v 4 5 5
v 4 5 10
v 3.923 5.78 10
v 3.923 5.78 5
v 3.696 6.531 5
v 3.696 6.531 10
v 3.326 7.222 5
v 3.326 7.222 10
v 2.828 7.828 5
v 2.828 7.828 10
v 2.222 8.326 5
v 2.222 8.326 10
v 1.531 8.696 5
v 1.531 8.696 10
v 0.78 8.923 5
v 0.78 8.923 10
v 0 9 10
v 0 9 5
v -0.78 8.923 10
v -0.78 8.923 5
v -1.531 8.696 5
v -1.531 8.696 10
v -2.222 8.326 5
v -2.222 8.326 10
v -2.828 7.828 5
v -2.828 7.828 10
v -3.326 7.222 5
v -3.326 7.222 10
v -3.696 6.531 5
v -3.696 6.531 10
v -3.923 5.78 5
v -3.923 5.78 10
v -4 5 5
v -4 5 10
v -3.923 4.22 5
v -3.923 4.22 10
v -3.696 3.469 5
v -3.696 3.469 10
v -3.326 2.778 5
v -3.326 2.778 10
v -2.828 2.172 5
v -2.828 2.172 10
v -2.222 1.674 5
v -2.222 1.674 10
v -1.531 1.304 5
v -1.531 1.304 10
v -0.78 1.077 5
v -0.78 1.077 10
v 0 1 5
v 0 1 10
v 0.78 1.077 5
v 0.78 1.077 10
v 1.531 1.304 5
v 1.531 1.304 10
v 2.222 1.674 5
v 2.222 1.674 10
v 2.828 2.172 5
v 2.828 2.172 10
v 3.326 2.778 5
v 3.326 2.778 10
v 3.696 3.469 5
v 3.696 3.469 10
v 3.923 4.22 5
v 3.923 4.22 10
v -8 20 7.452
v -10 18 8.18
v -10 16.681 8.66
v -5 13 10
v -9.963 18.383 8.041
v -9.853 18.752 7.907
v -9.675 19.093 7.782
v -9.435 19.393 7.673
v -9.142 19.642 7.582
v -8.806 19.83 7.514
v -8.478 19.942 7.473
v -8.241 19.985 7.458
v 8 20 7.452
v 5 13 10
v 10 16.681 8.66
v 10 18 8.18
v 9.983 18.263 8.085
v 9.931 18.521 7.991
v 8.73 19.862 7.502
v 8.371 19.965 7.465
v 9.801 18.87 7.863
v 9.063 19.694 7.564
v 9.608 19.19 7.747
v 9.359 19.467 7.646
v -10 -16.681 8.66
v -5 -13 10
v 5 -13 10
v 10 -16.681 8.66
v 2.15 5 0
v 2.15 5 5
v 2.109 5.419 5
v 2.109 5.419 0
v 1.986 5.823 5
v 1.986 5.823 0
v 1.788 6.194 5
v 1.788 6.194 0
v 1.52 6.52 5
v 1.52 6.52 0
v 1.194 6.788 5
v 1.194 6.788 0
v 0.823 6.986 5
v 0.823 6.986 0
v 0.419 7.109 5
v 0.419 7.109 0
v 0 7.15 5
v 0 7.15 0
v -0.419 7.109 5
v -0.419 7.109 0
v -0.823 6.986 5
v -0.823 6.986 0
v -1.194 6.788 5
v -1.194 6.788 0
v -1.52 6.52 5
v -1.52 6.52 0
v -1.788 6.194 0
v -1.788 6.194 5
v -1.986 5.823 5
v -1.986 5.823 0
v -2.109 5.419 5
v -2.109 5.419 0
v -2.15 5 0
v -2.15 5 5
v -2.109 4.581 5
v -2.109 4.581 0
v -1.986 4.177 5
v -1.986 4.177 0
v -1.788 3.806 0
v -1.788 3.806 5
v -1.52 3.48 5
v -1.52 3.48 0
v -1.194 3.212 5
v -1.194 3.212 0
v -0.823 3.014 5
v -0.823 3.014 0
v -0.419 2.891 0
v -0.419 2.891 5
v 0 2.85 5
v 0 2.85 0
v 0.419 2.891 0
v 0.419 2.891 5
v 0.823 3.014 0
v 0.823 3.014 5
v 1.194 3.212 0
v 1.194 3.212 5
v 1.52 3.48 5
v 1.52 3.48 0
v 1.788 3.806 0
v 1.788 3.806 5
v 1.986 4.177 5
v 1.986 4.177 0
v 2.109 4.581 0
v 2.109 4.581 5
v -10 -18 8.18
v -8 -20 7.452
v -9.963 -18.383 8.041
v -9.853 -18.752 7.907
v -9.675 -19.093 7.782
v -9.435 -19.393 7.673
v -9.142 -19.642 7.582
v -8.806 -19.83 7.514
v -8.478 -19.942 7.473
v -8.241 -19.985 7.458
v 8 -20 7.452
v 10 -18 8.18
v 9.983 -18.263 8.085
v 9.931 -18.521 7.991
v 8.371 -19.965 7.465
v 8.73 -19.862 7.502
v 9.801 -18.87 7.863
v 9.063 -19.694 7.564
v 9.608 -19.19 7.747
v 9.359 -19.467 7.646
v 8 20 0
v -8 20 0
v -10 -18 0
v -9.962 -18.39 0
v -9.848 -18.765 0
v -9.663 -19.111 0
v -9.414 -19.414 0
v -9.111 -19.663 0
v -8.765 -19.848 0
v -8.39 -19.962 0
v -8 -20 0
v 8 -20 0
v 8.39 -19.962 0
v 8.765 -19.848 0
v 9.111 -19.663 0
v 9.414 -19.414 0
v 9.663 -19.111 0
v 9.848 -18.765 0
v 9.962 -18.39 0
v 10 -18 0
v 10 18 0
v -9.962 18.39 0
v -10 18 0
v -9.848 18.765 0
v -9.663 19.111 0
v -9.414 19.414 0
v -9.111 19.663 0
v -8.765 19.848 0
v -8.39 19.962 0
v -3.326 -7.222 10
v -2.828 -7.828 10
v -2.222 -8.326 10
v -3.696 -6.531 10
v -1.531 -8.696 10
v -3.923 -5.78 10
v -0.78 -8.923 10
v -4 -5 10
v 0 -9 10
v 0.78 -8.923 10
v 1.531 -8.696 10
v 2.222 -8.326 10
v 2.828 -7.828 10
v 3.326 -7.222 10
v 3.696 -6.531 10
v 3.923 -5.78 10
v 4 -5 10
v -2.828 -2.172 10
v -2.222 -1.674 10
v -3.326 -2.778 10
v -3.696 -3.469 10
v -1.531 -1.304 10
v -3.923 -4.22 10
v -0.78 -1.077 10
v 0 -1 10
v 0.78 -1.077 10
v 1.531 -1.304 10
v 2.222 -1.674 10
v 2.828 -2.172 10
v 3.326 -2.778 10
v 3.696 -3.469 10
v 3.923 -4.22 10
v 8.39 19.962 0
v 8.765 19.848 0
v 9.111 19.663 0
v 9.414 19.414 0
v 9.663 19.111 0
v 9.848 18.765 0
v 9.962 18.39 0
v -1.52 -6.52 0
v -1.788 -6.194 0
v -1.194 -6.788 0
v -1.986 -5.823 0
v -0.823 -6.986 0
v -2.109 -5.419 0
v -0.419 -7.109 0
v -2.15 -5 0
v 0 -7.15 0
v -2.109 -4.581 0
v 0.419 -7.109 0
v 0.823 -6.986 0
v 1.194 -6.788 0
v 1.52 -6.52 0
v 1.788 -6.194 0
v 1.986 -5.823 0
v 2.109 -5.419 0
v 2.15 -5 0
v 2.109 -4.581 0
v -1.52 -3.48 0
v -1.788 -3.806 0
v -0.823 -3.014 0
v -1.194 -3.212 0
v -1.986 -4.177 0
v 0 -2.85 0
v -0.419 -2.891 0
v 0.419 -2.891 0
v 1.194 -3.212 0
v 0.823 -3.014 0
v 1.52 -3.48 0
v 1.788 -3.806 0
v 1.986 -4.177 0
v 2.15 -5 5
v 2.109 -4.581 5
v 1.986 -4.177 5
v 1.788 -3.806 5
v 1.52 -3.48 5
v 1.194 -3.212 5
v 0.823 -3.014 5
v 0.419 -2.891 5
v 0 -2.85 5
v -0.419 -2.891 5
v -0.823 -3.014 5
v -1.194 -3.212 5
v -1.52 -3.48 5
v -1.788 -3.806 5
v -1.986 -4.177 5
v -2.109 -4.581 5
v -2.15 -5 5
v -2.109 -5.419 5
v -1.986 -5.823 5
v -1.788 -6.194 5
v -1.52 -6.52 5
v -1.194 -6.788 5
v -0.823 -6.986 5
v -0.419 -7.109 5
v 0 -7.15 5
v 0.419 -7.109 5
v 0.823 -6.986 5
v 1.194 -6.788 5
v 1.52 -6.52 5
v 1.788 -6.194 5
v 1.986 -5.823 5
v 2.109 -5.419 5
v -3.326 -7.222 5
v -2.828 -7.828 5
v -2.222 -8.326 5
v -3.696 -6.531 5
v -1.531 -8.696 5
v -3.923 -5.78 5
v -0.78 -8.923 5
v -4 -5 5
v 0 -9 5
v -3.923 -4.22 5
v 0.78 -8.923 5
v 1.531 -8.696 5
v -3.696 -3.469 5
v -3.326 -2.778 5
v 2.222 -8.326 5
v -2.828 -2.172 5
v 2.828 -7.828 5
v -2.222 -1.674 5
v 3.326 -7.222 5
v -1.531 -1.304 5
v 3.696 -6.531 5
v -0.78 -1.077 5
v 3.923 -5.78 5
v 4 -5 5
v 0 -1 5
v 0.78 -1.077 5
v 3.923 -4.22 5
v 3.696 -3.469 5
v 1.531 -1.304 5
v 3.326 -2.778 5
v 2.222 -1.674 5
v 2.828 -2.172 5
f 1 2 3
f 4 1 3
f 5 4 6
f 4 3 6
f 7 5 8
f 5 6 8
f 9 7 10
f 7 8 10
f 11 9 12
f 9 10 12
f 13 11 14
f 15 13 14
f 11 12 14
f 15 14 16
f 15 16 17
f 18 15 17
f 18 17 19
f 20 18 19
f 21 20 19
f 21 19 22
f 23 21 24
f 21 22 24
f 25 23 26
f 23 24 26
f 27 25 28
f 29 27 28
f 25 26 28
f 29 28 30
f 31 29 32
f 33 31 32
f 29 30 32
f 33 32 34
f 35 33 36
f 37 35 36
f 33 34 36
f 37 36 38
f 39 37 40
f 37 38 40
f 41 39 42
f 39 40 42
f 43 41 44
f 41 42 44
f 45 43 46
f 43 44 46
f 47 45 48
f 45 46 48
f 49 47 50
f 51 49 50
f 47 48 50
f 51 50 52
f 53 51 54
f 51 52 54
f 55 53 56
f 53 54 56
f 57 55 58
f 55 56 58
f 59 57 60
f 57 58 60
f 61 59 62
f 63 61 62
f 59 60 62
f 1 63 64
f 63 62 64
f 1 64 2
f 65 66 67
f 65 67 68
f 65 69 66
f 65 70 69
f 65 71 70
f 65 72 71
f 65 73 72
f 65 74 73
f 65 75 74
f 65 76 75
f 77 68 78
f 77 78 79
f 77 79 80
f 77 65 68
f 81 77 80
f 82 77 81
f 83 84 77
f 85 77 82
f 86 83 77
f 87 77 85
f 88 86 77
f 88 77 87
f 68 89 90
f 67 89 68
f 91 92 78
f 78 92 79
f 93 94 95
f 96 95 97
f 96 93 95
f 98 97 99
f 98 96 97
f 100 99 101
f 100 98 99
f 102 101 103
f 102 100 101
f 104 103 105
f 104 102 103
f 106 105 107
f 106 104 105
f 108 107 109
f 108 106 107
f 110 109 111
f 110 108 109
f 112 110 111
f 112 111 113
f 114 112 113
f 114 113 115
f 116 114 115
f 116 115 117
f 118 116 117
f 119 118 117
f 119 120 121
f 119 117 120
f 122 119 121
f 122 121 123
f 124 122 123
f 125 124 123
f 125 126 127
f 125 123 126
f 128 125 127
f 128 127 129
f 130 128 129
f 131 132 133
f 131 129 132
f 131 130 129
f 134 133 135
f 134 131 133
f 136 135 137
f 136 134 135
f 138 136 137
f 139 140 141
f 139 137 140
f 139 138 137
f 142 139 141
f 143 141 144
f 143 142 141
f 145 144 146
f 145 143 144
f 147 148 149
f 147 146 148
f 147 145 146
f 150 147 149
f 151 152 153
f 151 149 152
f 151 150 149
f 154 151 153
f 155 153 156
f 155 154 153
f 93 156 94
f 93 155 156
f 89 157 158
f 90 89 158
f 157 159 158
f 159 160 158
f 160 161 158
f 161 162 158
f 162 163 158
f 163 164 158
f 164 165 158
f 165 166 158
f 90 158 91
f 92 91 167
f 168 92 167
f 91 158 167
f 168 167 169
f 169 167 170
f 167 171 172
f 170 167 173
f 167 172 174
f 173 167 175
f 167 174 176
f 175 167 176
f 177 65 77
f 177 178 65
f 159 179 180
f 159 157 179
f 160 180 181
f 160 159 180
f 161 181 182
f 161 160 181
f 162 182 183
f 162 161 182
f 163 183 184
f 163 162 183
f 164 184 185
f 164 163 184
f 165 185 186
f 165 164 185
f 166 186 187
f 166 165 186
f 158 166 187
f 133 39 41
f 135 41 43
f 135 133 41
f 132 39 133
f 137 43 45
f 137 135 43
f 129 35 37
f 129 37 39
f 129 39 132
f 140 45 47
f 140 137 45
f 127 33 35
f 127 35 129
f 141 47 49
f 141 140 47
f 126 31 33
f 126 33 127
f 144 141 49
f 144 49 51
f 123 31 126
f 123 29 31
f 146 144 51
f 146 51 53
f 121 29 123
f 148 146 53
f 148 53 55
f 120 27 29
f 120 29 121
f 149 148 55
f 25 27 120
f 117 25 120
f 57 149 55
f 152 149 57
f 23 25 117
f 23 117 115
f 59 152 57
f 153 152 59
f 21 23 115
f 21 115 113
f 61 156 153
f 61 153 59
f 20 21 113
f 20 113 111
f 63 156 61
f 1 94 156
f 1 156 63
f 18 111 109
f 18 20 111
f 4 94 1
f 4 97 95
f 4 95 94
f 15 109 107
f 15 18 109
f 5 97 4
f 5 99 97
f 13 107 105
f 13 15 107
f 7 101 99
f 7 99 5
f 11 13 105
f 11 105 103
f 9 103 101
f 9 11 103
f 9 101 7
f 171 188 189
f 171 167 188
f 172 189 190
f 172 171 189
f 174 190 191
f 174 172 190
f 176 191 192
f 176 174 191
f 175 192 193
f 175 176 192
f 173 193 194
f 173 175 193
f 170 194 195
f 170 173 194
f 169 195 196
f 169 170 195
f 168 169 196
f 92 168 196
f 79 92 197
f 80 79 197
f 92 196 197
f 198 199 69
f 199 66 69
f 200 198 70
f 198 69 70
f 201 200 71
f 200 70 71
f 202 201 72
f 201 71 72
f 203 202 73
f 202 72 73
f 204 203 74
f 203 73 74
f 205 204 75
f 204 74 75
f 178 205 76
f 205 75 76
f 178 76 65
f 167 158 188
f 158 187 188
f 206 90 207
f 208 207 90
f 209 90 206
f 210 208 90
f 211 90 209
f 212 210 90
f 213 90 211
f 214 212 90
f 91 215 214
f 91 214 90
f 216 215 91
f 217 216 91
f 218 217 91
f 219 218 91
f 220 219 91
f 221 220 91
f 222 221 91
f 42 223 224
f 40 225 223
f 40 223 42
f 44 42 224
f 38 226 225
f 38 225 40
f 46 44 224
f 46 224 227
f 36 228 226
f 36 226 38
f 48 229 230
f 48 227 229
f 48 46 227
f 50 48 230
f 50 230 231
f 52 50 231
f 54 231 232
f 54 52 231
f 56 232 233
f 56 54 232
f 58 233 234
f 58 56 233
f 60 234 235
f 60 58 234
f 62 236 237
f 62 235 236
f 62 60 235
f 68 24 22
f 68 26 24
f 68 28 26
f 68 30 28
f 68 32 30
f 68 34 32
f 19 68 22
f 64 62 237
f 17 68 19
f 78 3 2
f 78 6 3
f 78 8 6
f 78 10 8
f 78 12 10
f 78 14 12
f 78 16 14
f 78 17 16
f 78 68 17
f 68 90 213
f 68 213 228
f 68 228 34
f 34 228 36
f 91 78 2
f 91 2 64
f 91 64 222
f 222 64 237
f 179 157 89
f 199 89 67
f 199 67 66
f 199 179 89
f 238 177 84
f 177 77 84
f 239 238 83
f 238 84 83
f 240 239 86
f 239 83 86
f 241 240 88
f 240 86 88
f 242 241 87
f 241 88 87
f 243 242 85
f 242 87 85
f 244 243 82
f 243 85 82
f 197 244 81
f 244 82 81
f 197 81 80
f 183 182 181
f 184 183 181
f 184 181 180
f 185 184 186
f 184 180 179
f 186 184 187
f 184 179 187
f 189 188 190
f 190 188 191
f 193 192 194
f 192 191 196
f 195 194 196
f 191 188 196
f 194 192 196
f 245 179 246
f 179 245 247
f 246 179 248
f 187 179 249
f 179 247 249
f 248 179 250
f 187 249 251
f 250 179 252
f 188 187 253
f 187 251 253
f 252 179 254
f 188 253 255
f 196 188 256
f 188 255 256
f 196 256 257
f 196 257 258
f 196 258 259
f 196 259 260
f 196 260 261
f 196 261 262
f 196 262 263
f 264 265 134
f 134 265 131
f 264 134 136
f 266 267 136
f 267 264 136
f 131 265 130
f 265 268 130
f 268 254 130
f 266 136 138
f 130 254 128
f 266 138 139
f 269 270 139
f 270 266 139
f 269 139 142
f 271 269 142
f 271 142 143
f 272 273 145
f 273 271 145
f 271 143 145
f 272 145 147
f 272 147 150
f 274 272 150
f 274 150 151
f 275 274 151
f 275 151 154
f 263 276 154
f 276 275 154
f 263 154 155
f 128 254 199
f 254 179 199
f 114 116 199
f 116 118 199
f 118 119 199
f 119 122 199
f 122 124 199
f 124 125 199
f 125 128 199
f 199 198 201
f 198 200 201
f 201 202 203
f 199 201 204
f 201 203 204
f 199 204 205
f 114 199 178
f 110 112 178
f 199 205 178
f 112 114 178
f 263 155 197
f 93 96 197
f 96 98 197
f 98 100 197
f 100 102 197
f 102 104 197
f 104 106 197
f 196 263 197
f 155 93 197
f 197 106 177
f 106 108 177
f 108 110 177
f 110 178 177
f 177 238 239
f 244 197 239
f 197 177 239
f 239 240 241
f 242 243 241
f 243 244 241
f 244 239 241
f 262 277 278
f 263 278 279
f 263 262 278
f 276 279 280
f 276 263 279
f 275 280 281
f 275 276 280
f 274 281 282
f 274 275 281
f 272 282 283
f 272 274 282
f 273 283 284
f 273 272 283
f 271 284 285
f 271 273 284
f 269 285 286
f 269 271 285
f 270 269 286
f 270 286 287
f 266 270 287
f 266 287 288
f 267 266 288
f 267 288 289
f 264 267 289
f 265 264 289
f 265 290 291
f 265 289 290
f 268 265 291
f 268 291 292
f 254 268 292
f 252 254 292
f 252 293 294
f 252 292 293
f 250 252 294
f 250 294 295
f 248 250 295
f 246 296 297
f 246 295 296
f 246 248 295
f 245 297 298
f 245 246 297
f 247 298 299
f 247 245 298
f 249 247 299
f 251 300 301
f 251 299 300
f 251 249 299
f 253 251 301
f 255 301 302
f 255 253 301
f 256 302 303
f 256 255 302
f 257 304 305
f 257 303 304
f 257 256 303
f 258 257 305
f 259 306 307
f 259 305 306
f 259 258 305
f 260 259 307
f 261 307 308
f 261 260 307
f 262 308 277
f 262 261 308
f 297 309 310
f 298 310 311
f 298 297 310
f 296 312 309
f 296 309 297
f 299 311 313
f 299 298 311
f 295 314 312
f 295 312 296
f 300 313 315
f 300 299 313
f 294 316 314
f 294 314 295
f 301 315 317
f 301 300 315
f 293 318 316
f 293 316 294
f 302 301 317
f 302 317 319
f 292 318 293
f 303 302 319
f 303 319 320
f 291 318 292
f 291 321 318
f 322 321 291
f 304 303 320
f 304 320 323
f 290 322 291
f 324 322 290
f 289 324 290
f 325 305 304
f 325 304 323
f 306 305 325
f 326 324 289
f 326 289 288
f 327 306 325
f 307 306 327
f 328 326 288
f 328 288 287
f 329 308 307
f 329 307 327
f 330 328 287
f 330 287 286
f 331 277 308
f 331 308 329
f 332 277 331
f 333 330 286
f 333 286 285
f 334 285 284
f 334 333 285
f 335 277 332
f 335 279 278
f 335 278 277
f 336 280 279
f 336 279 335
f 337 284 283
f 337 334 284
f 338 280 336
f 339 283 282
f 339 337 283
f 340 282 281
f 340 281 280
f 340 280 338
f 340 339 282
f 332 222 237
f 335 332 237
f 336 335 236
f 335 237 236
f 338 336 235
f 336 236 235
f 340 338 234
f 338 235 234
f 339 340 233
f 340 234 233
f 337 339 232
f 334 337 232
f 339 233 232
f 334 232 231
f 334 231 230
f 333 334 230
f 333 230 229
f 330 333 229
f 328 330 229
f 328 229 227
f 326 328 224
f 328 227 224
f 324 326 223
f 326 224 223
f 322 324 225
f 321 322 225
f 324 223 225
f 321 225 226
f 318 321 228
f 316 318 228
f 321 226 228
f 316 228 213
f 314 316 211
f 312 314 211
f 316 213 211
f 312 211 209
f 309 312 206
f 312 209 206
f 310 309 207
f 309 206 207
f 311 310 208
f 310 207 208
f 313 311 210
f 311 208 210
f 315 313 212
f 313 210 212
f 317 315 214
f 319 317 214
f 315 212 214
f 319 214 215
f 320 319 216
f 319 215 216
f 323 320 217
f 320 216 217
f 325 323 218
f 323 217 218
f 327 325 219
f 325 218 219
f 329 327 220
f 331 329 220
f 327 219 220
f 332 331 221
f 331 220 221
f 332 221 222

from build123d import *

# Parameters (mm, degrees)
SKETCH1_W           = 20
SKETCH1_H           = 40
SKETCH1_R           = 2.15
BOSS_EXTRUDE1_DEPTH = 10
CHAMFER1_SIZE       = 5
CHAMFER1_SIZE2      = 1.339745962
CHAMFER2_SIZE       = 7
CHAMFER2_SIZE2      = 2.54779164
SKETCH2_R           = 4
CUT_EXTRUDE1_DEPTH  = 5
FILLET1_R           = 2


with BuildPart() as part:
    # Sketch1 → Boss-Extrude1 (new body)
    with BuildSketch(Plane.XY):
        Rectangle(SKETCH1_W, SKETCH1_H)
        with Locations((0, -5)):
            Circle(SKETCH1_R, mode=Mode.SUBTRACT)
        with Locations((0, 5)):
            Circle(SKETCH1_R, mode=Mode.SUBTRACT)
    extrude(amount=BOSS_EXTRUDE1_DEPTH)

    # Chamfer1
    chamfer1_edges = [part.edges().sort_by_distance(p)[0] for p in [
        (-10, 0, 10),
        (10, 0, 10),
    ]]
    chamfer1_side = [part.faces().sort_by_distance(p)[0] for p in [
        (0, 0, 10),
    ]]
    chamfer(chamfer1_edges, length=CHAMFER1_SIZE, length2=CHAMFER1_SIZE2, reference=chamfer1_side[0])

    # Chamfer2
    chamfer2_edges = [part.edges().sort_by_distance(p)[0] for p in [
        (0, -20, 10),
        (0, 20, 10),
    ]]
    chamfer2_side = [part.faces().sort_by_distance(p)[0] for p in [
        (0, 0, 10),
    ]]
    chamfer(chamfer2_edges, length=CHAMFER2_SIZE, length2=CHAMFER2_SIZE2, reference=chamfer2_side[0])

    # Sketch2 → Cut-Extrude1 (cut)
    with BuildSketch(Plane.XY.offset(10)):
        with Locations((0, 5)):
            Circle(SKETCH2_R)
        with Locations((0, -5)):
            Circle(SKETCH2_R)
    extrude(amount=-CUT_EXTRUDE1_DEPTH, mode=Mode.SUBTRACT)

    # Fillet1
    fillet1_edges = [part.edges().sort_by_distance(p)[0] for p in [
        (10, 20, 3.72610418),
        (10, -20, 3.72610418),
        (-10, -20, 3.72610418),
        (-10, 20, 3.72610418),
    ]]
    fillet(fillet1_edges, radius=FILLET1_R)


solid = part.part
